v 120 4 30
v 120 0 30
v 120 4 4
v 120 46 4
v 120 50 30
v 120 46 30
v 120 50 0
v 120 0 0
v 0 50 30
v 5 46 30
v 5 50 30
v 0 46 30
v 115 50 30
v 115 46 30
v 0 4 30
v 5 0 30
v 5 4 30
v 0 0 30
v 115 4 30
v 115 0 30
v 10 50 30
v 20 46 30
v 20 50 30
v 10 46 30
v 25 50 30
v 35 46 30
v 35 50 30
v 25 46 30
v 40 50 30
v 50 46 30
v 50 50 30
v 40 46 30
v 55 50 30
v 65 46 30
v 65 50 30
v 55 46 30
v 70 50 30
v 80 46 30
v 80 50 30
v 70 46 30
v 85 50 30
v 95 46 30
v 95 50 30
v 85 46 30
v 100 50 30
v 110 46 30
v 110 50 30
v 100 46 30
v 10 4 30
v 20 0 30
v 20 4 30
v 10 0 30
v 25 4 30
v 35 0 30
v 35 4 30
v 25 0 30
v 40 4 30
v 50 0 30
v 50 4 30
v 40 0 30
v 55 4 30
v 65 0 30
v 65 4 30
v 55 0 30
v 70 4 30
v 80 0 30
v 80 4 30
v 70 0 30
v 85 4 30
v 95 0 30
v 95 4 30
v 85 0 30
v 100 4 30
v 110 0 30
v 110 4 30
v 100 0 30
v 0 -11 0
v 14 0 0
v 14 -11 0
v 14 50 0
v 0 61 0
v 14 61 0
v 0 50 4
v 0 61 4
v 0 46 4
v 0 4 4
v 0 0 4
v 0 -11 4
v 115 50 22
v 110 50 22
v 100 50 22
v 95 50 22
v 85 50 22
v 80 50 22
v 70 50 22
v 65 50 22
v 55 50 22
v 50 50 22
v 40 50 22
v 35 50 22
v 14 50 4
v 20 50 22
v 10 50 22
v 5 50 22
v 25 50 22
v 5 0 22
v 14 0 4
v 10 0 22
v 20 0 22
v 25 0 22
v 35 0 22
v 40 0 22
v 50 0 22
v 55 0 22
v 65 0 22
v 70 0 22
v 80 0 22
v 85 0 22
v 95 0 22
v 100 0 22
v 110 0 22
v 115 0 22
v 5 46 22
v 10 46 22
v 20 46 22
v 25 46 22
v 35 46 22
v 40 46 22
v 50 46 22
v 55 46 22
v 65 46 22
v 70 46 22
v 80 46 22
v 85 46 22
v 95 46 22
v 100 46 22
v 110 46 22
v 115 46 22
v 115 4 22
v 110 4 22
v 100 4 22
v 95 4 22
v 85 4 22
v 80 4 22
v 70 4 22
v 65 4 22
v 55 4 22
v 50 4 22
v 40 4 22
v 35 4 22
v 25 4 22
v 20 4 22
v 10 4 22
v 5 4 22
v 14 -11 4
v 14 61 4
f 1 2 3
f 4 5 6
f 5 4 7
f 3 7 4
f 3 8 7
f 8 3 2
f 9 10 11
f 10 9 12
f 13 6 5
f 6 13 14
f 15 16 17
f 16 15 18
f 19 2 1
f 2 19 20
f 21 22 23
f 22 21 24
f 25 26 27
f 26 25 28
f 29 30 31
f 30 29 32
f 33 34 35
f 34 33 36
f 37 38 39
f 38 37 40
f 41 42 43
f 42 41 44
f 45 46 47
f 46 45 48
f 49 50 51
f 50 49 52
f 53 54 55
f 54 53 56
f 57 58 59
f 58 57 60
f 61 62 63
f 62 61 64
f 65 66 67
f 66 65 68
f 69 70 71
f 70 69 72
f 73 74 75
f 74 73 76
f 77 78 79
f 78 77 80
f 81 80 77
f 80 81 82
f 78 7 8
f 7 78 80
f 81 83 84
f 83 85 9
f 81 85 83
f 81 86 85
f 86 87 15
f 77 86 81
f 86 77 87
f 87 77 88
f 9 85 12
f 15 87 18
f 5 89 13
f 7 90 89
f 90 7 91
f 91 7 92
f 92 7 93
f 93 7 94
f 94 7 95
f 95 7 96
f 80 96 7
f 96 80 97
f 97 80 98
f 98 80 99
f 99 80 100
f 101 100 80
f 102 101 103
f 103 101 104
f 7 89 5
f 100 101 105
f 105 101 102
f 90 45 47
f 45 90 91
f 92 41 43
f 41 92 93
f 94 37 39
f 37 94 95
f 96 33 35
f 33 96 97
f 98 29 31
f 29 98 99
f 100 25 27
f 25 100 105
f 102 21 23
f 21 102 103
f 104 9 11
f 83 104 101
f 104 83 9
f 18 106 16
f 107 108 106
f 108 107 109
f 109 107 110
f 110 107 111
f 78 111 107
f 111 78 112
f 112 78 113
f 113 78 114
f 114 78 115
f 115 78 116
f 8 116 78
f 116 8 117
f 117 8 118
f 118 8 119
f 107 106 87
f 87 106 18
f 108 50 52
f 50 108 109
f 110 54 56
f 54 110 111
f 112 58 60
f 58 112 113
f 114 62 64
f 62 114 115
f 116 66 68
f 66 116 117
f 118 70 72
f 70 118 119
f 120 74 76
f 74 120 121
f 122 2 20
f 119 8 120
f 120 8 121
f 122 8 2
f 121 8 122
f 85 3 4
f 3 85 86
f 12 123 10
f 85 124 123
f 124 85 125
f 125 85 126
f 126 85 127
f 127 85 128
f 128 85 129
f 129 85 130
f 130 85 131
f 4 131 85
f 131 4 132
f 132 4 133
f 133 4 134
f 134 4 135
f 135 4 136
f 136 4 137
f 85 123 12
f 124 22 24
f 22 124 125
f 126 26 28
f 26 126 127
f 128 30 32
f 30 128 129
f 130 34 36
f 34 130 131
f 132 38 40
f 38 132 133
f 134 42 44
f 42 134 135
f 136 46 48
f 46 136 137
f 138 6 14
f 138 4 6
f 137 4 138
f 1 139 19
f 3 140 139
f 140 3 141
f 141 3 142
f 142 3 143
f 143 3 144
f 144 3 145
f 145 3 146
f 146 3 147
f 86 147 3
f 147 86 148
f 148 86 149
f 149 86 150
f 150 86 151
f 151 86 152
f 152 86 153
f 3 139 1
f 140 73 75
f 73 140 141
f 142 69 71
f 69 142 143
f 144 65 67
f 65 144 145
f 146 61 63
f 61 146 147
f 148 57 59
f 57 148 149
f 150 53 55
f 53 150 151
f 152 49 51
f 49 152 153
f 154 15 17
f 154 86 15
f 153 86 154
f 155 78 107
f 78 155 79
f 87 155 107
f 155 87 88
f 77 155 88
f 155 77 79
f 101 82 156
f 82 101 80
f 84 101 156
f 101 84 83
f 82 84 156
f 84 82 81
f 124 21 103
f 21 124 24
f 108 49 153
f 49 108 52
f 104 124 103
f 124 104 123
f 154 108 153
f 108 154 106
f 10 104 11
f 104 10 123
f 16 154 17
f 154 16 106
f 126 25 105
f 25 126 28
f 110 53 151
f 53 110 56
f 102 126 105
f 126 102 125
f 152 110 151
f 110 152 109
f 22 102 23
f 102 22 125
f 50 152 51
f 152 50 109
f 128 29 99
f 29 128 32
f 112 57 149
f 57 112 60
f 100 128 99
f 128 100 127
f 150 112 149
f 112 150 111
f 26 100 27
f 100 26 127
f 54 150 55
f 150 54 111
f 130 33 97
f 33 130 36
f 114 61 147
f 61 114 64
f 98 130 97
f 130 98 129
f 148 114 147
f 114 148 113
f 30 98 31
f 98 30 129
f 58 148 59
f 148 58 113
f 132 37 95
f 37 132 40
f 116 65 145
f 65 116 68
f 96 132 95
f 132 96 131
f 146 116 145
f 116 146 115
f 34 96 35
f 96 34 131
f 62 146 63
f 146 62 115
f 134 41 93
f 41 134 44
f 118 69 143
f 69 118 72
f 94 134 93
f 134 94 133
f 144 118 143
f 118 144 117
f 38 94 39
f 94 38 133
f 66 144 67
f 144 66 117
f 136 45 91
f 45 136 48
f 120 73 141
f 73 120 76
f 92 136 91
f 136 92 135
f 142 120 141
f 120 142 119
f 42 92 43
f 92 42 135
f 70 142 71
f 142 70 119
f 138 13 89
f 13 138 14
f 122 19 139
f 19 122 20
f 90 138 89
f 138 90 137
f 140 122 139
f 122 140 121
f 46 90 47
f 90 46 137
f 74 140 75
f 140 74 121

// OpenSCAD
$fn = 32;

// ----------------------------------------------------------------------
// Cable duct: 120 x 50 x 30 mm, 8 fingers
// ----------------------------------------------------------------------

// --- parameters (mm) ---
duct_len = 120;           // duct length, X
duct_w = 50;              // duct width, Y
duct_h = 30;              // duct height, Z
wall_t = 4;               // side wall thickness
floor_t = 4;              // floor thickness
slot_w = 5;               // finger slot width
slot_h = 18;              // finger slot height
fingers = 8;              // number of finger slots per side
pitch = 15;               // finger pitch
ear_w = 12;               // mounting ear width
ear_l = 14;               // mounting ear length

module shell() {
  difference() {
    cube([duct_len, duct_w, duct_h]);
    /* open top channel */
    translate([-wall_t - 1, wall_t, floor_t])
      cube([duct_len + 2 * wall_t + 2, duct_w - 2 * wall_t, duct_h + 1]);
  }
}

module ears() {
  translate([0, -ear_w + 1, 0]) cube([ear_l, ear_w, floor_t]);
  translate([0, duct_w - 1, 0]) cube([ear_l, ear_w, floor_t]);
}

difference() {
  union() {
    shell();
    ears();
  }
  /* finger slots cut through both side walls */
  for (i = [0 : fingers - 1]) translate([pitch / 2 + i * pitch - slot_w / 2, -1, floor_t + slot_h]) cube([slot_w, duct_w + 2, duct_h]);
}
